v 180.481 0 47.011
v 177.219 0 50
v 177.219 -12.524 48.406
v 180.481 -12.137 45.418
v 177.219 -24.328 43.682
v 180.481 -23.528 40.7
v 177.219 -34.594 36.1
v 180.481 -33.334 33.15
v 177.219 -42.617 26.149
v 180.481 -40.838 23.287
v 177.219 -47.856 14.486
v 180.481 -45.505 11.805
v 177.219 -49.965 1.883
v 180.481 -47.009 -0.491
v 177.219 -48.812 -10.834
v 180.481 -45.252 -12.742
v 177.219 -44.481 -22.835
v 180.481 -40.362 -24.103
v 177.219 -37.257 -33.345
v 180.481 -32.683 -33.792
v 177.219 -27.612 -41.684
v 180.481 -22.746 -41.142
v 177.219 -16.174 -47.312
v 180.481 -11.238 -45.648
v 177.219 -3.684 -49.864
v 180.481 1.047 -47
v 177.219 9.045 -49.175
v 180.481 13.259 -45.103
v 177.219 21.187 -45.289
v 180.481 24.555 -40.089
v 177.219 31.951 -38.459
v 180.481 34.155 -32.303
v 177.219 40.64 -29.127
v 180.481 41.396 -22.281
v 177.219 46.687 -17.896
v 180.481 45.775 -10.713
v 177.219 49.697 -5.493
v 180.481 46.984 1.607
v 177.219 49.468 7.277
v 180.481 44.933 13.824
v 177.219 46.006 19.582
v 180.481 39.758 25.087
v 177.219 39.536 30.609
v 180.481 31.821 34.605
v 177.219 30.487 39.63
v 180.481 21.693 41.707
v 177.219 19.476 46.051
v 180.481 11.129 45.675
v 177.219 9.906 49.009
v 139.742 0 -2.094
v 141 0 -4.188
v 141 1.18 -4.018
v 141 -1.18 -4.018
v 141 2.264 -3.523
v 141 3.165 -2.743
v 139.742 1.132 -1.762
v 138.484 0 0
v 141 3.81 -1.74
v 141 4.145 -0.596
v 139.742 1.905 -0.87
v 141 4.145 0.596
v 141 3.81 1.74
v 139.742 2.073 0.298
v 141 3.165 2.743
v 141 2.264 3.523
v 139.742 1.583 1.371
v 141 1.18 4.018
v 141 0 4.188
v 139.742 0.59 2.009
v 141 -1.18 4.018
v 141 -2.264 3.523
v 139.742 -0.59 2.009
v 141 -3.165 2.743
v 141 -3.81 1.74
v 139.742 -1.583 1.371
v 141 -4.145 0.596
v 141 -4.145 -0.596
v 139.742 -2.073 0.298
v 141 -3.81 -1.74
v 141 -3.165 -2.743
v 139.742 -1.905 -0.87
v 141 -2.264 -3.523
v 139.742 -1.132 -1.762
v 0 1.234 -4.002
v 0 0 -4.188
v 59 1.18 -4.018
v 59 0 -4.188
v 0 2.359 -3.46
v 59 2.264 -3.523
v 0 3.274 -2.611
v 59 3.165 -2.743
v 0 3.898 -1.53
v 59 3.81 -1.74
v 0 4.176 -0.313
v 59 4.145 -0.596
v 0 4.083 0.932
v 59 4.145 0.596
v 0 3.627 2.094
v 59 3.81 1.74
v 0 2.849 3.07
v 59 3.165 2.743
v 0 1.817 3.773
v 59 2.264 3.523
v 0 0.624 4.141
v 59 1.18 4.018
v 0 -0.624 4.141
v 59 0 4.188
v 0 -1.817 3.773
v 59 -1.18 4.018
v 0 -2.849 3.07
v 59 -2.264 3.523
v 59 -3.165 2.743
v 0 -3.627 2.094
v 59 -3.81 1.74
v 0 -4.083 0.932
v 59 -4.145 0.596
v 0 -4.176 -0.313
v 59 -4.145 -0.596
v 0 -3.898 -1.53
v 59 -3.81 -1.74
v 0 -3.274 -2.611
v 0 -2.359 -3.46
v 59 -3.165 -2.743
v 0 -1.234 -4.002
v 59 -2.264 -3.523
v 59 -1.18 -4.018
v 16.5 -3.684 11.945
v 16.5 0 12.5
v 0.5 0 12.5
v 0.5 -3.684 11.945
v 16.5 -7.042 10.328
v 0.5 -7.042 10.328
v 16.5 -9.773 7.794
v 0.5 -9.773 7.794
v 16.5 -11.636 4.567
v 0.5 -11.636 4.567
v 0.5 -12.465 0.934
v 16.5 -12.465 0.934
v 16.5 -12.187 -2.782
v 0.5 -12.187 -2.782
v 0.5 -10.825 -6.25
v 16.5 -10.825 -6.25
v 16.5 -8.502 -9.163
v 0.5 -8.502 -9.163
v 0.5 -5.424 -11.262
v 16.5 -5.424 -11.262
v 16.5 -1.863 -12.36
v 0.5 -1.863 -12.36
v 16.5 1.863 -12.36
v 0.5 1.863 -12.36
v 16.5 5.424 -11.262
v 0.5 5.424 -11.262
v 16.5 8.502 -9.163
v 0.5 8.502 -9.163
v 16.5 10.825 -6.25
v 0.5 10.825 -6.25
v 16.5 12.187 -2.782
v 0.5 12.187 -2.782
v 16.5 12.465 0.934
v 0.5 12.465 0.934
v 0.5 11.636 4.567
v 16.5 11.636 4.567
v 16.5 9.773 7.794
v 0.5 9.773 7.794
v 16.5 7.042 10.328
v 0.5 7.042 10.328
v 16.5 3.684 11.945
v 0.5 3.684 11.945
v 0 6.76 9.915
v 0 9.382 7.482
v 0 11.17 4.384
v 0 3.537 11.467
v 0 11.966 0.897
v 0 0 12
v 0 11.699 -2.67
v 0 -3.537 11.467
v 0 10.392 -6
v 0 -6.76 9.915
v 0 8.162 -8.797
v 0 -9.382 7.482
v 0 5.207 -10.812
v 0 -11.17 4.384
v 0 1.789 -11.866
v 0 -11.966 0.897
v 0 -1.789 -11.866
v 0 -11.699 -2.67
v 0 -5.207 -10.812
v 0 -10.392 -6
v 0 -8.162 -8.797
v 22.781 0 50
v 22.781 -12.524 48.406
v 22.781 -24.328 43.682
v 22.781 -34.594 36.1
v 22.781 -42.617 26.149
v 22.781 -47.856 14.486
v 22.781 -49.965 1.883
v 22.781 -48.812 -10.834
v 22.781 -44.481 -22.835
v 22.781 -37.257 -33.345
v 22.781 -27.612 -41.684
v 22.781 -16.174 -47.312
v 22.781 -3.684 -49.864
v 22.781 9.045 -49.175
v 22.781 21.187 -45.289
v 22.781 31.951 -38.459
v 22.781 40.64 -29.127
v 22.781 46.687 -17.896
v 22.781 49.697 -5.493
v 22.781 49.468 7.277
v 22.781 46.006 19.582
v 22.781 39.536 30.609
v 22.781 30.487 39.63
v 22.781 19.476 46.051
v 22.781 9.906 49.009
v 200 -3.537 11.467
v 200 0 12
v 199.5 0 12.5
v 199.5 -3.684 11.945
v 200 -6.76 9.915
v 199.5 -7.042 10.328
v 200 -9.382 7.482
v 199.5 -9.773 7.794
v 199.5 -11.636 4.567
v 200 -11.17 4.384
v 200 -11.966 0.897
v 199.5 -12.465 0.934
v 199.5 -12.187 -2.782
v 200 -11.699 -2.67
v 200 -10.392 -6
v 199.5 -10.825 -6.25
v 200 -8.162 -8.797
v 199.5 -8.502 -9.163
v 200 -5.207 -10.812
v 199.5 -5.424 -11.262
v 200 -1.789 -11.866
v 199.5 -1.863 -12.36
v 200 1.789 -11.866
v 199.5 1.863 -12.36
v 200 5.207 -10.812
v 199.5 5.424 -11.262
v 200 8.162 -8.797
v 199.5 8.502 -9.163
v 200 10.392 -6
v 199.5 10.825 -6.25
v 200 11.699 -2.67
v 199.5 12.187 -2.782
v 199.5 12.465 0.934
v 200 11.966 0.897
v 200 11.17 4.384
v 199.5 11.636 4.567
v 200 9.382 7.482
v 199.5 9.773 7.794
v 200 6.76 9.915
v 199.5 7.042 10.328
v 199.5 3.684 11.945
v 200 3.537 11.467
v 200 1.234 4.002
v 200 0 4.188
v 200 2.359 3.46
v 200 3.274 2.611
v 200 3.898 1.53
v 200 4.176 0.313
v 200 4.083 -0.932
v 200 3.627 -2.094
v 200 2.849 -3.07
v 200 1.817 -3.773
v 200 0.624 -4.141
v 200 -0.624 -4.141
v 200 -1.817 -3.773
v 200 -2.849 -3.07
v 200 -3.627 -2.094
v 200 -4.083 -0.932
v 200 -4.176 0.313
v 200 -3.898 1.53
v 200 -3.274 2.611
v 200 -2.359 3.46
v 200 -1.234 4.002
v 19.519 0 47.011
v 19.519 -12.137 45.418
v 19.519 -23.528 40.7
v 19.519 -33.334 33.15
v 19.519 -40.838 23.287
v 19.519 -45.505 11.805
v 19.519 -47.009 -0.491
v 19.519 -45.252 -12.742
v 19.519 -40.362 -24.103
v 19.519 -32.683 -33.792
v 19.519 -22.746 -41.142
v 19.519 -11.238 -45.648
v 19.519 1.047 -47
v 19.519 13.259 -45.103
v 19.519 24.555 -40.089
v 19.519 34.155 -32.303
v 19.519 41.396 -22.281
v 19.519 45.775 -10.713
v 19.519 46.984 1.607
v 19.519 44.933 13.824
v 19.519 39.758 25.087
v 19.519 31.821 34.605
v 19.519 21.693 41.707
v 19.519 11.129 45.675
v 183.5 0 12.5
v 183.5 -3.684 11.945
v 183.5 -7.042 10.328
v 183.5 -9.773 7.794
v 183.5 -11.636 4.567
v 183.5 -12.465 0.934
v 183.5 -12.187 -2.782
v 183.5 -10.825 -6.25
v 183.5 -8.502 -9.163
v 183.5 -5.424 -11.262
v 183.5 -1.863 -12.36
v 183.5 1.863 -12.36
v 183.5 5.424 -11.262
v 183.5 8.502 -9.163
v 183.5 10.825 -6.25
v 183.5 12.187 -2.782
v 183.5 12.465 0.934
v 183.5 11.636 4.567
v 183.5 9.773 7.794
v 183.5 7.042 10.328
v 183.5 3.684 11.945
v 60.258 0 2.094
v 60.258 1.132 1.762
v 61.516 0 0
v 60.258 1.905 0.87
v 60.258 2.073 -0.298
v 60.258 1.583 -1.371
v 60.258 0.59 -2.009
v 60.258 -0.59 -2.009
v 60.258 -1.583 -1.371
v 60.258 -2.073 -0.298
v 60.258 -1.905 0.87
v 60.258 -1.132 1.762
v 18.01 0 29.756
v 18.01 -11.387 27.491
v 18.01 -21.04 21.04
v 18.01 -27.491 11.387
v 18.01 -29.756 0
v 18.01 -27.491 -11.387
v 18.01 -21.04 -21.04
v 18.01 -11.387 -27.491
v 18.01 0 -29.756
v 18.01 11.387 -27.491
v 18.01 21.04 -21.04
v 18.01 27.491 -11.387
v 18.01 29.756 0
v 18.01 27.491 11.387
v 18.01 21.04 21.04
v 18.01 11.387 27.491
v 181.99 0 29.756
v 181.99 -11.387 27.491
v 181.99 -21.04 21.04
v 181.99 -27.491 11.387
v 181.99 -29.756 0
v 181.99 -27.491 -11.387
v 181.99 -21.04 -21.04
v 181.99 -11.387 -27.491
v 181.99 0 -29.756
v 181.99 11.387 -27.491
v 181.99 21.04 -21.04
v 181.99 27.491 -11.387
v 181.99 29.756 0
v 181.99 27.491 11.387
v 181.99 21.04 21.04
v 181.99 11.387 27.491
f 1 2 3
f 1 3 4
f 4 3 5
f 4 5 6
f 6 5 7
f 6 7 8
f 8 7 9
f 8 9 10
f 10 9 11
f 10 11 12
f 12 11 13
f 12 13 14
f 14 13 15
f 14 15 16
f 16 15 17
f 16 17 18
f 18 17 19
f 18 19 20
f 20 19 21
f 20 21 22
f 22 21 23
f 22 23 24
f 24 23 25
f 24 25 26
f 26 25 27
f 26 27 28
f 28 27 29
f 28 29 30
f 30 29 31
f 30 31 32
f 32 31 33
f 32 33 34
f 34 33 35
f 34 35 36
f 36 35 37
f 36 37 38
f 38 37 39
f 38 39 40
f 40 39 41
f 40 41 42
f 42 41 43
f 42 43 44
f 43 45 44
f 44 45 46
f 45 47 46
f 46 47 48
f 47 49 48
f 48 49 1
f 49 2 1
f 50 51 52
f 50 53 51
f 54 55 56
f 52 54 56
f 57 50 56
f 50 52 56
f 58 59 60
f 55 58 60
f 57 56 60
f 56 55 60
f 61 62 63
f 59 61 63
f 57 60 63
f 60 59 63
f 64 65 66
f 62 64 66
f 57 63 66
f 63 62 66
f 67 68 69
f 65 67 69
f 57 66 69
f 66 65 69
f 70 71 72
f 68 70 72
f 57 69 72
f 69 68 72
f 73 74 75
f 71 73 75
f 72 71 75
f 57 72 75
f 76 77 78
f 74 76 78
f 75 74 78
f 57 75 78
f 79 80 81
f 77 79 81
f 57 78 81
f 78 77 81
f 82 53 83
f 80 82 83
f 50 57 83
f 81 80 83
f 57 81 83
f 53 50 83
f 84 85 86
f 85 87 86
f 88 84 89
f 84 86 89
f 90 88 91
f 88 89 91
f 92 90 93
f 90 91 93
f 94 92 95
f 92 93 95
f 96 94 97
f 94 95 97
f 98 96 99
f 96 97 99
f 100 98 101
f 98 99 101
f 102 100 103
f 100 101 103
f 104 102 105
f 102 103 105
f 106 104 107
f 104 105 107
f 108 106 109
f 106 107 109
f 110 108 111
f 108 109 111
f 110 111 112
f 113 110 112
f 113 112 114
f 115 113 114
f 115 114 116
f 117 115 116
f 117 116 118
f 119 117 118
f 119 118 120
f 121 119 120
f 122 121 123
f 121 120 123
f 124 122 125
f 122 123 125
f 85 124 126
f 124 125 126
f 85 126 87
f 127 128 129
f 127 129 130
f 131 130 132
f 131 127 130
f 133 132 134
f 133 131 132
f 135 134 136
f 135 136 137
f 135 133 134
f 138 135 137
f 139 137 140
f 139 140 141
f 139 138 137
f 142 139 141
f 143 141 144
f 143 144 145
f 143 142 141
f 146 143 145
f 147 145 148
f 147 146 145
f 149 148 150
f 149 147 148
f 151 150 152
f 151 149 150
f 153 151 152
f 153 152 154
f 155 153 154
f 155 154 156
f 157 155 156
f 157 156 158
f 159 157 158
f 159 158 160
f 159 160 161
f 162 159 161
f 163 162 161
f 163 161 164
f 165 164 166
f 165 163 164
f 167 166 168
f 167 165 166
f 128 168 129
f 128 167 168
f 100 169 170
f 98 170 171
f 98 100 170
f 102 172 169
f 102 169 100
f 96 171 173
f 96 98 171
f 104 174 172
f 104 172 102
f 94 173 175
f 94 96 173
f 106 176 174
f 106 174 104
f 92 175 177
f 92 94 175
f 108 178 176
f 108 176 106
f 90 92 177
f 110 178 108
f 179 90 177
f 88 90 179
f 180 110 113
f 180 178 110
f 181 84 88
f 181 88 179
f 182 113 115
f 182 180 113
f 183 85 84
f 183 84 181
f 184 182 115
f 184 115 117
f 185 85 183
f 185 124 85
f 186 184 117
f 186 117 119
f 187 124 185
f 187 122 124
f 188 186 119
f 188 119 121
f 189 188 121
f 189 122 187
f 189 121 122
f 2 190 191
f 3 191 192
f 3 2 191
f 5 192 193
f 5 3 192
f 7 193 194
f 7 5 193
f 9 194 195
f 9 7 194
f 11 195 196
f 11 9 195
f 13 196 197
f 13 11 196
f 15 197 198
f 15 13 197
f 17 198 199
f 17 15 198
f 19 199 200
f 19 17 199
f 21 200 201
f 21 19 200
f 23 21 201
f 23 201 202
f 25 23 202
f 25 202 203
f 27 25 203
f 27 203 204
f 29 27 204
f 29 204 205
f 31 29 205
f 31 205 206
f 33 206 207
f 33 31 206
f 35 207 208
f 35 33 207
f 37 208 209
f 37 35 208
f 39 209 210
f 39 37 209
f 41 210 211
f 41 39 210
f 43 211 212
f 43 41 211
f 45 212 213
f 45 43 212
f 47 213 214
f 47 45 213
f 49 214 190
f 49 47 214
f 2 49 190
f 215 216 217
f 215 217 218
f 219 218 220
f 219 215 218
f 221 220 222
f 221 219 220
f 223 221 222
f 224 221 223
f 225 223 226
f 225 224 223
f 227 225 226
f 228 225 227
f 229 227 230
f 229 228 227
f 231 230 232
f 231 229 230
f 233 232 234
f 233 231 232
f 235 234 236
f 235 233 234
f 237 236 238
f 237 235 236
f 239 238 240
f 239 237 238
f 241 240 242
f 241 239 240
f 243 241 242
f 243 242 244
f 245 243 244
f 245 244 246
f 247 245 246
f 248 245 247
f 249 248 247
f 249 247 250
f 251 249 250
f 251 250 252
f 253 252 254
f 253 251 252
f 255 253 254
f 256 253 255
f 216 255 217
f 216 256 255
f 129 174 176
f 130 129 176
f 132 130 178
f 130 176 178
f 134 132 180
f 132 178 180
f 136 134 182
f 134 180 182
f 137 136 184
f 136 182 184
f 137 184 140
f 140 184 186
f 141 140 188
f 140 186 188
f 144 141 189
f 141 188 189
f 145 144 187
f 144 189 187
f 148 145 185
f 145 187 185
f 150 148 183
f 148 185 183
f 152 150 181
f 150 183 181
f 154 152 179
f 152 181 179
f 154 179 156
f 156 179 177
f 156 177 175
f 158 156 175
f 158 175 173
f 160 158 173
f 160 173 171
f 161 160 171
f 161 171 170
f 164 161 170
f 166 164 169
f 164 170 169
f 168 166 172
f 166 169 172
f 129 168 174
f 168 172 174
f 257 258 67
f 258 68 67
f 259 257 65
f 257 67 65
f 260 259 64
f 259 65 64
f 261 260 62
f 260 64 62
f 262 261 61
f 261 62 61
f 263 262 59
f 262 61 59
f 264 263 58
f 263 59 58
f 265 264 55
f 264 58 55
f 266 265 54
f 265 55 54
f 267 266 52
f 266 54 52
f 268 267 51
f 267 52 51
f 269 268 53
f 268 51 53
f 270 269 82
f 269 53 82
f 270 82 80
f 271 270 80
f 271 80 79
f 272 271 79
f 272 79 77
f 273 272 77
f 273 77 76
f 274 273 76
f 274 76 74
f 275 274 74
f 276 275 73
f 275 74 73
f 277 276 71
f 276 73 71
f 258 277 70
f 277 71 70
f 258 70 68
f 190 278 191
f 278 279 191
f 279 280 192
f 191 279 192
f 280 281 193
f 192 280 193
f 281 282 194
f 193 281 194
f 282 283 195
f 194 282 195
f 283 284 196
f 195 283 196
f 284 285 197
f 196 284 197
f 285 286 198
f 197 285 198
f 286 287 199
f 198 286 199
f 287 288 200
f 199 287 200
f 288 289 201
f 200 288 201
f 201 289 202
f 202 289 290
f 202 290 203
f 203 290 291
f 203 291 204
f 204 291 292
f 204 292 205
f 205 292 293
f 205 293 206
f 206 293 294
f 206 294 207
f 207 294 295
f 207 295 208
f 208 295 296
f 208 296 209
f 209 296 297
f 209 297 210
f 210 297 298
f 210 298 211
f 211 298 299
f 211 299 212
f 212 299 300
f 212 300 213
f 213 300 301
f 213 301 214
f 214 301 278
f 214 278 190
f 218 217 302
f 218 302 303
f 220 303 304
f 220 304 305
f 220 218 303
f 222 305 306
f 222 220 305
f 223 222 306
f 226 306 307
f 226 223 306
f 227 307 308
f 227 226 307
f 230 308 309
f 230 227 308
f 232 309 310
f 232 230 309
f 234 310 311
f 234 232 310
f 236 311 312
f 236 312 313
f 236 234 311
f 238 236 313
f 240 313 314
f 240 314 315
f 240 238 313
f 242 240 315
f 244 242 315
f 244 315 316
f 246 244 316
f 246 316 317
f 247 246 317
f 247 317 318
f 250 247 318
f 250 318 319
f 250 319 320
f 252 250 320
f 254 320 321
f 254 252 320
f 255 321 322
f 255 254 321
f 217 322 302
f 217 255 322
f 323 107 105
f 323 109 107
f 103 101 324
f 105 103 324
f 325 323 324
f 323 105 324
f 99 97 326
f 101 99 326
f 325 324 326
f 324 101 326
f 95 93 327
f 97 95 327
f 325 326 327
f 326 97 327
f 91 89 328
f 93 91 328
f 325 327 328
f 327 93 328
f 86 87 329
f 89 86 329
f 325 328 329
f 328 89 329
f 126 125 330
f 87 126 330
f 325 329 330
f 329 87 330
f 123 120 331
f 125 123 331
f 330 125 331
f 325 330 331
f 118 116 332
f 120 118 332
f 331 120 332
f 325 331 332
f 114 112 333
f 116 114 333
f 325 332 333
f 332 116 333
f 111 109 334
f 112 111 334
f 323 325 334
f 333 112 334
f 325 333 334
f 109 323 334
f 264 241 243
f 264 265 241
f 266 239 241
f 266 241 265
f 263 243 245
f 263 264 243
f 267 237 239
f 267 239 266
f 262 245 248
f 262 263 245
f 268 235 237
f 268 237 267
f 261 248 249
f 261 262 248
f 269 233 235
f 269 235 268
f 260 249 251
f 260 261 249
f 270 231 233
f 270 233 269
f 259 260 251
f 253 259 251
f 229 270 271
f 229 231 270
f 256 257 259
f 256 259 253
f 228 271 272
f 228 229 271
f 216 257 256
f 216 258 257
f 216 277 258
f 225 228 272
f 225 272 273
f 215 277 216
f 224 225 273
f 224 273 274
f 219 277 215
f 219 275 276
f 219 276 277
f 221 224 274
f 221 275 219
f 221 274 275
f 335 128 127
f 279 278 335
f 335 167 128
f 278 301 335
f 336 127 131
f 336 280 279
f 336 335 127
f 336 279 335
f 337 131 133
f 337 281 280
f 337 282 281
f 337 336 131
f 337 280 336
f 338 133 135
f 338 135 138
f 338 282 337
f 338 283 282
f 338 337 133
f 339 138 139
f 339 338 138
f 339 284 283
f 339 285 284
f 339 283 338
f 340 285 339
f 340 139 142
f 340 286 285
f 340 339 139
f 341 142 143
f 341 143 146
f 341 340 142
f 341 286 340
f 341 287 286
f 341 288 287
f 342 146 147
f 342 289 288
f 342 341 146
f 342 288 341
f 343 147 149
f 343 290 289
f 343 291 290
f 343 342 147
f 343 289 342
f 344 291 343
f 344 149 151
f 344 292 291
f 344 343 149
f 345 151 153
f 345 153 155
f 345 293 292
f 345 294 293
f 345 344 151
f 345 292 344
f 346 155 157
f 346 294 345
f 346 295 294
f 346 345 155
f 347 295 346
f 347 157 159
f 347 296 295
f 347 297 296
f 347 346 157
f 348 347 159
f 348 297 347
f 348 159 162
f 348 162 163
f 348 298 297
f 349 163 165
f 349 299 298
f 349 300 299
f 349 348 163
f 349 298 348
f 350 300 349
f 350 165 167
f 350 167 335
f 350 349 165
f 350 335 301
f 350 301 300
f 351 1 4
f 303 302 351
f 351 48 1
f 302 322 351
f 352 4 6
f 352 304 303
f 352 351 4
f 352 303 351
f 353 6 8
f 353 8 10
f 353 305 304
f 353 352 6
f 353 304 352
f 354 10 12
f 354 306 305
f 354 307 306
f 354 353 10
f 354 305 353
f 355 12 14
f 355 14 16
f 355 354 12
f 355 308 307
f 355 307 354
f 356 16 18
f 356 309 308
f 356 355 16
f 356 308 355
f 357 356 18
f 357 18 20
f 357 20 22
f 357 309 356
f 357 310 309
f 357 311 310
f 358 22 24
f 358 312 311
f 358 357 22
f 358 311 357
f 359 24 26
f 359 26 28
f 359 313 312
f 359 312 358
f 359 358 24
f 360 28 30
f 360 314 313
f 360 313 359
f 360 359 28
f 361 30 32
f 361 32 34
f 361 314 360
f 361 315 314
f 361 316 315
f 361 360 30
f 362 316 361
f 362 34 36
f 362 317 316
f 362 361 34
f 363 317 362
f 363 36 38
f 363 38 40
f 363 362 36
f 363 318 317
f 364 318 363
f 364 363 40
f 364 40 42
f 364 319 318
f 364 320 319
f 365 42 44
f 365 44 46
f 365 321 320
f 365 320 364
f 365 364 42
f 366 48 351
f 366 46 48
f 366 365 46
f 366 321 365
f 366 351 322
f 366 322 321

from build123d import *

# Parameters (mm, degrees)
CHAMFER_1_SIZE      = 3
CHAMFER_2_SIZE      = 0.5
HOLE_WIZARD_1_D     = 8.376
HOLE_WIZARD_1_DEPTH = 59
HOLE_WIZARD_1_TIP   = 2.516404272
HOLE_WIZARD_2_D     = 8.376
HOLE_WIZARD_2_DEPTH = 59
HOLE_WIZARD_2_TIP   = 2.516404272


with BuildPart() as part:
    # 草圖1 → 迴轉1 (revolve)
    with BuildSketch(Plane.XY, mode=Mode.PRIVATE) as revolve_1_sk:
        Polygon((0, 0), (0, 12.5), (16.5, 12.5), (19.780824882, 50), (180.219175118, 50), (183.5, 12.5), (200, 12.5), (200, 0), align=None)
    revolve(revolve_1_sk.sketch.rotate(Axis((0, 0, 0), (1, 0, 0)), 90), axis=Axis((0, 0, 0), (1, 0, 0)))

    # 倒角1
    chamfer_1_edges = [part.edges().sort_by_distance(p)[0] for p in [
        (180.219175118, 0, -50),
        (19.780824882, 0, -50),
    ]]
    chamfer(chamfer_1_edges, length=CHAMFER_1_SIZE)

    # 倒角2
    chamfer_2_edges = [part.edges().sort_by_distance(p)[0] for p in [
        (200, 0, -12.5),
        (0, 0, -12.5),
    ]]
    chamfer(chamfer_2_edges, length=CHAMFER_2_SIZE)

    # 孔1
    with Locations(Plane(origin=(200, 0, 0), x_dir=(0, 0, -1), z_dir=(1, 0, 0))):
        with Locations((0, 0)):
            Hole(HOLE_WIZARD_1_D / 2, depth=HOLE_WIZARD_1_DEPTH)
            with Locations((0, 0, -(HOLE_WIZARD_1_DEPTH + HOLE_WIZARD_1_TIP / 2))):  # 118° drill point
                Cone(0, HOLE_WIZARD_1_D / 2, HOLE_WIZARD_1_TIP, mode=Mode.SUBTRACT)

    # 孔2
    with Locations(Plane.ZY):
        with Locations((0, 0)):
            Hole(HOLE_WIZARD_2_D / 2, depth=HOLE_WIZARD_2_DEPTH)
            with Locations((0, 0, -(HOLE_WIZARD_2_DEPTH + HOLE_WIZARD_2_TIP / 2))):  # 118° drill point
                Cone(0, HOLE_WIZARD_2_D / 2, HOLE_WIZARD_2_TIP, mode=Mode.SUBTRACT)


solid = part.part
